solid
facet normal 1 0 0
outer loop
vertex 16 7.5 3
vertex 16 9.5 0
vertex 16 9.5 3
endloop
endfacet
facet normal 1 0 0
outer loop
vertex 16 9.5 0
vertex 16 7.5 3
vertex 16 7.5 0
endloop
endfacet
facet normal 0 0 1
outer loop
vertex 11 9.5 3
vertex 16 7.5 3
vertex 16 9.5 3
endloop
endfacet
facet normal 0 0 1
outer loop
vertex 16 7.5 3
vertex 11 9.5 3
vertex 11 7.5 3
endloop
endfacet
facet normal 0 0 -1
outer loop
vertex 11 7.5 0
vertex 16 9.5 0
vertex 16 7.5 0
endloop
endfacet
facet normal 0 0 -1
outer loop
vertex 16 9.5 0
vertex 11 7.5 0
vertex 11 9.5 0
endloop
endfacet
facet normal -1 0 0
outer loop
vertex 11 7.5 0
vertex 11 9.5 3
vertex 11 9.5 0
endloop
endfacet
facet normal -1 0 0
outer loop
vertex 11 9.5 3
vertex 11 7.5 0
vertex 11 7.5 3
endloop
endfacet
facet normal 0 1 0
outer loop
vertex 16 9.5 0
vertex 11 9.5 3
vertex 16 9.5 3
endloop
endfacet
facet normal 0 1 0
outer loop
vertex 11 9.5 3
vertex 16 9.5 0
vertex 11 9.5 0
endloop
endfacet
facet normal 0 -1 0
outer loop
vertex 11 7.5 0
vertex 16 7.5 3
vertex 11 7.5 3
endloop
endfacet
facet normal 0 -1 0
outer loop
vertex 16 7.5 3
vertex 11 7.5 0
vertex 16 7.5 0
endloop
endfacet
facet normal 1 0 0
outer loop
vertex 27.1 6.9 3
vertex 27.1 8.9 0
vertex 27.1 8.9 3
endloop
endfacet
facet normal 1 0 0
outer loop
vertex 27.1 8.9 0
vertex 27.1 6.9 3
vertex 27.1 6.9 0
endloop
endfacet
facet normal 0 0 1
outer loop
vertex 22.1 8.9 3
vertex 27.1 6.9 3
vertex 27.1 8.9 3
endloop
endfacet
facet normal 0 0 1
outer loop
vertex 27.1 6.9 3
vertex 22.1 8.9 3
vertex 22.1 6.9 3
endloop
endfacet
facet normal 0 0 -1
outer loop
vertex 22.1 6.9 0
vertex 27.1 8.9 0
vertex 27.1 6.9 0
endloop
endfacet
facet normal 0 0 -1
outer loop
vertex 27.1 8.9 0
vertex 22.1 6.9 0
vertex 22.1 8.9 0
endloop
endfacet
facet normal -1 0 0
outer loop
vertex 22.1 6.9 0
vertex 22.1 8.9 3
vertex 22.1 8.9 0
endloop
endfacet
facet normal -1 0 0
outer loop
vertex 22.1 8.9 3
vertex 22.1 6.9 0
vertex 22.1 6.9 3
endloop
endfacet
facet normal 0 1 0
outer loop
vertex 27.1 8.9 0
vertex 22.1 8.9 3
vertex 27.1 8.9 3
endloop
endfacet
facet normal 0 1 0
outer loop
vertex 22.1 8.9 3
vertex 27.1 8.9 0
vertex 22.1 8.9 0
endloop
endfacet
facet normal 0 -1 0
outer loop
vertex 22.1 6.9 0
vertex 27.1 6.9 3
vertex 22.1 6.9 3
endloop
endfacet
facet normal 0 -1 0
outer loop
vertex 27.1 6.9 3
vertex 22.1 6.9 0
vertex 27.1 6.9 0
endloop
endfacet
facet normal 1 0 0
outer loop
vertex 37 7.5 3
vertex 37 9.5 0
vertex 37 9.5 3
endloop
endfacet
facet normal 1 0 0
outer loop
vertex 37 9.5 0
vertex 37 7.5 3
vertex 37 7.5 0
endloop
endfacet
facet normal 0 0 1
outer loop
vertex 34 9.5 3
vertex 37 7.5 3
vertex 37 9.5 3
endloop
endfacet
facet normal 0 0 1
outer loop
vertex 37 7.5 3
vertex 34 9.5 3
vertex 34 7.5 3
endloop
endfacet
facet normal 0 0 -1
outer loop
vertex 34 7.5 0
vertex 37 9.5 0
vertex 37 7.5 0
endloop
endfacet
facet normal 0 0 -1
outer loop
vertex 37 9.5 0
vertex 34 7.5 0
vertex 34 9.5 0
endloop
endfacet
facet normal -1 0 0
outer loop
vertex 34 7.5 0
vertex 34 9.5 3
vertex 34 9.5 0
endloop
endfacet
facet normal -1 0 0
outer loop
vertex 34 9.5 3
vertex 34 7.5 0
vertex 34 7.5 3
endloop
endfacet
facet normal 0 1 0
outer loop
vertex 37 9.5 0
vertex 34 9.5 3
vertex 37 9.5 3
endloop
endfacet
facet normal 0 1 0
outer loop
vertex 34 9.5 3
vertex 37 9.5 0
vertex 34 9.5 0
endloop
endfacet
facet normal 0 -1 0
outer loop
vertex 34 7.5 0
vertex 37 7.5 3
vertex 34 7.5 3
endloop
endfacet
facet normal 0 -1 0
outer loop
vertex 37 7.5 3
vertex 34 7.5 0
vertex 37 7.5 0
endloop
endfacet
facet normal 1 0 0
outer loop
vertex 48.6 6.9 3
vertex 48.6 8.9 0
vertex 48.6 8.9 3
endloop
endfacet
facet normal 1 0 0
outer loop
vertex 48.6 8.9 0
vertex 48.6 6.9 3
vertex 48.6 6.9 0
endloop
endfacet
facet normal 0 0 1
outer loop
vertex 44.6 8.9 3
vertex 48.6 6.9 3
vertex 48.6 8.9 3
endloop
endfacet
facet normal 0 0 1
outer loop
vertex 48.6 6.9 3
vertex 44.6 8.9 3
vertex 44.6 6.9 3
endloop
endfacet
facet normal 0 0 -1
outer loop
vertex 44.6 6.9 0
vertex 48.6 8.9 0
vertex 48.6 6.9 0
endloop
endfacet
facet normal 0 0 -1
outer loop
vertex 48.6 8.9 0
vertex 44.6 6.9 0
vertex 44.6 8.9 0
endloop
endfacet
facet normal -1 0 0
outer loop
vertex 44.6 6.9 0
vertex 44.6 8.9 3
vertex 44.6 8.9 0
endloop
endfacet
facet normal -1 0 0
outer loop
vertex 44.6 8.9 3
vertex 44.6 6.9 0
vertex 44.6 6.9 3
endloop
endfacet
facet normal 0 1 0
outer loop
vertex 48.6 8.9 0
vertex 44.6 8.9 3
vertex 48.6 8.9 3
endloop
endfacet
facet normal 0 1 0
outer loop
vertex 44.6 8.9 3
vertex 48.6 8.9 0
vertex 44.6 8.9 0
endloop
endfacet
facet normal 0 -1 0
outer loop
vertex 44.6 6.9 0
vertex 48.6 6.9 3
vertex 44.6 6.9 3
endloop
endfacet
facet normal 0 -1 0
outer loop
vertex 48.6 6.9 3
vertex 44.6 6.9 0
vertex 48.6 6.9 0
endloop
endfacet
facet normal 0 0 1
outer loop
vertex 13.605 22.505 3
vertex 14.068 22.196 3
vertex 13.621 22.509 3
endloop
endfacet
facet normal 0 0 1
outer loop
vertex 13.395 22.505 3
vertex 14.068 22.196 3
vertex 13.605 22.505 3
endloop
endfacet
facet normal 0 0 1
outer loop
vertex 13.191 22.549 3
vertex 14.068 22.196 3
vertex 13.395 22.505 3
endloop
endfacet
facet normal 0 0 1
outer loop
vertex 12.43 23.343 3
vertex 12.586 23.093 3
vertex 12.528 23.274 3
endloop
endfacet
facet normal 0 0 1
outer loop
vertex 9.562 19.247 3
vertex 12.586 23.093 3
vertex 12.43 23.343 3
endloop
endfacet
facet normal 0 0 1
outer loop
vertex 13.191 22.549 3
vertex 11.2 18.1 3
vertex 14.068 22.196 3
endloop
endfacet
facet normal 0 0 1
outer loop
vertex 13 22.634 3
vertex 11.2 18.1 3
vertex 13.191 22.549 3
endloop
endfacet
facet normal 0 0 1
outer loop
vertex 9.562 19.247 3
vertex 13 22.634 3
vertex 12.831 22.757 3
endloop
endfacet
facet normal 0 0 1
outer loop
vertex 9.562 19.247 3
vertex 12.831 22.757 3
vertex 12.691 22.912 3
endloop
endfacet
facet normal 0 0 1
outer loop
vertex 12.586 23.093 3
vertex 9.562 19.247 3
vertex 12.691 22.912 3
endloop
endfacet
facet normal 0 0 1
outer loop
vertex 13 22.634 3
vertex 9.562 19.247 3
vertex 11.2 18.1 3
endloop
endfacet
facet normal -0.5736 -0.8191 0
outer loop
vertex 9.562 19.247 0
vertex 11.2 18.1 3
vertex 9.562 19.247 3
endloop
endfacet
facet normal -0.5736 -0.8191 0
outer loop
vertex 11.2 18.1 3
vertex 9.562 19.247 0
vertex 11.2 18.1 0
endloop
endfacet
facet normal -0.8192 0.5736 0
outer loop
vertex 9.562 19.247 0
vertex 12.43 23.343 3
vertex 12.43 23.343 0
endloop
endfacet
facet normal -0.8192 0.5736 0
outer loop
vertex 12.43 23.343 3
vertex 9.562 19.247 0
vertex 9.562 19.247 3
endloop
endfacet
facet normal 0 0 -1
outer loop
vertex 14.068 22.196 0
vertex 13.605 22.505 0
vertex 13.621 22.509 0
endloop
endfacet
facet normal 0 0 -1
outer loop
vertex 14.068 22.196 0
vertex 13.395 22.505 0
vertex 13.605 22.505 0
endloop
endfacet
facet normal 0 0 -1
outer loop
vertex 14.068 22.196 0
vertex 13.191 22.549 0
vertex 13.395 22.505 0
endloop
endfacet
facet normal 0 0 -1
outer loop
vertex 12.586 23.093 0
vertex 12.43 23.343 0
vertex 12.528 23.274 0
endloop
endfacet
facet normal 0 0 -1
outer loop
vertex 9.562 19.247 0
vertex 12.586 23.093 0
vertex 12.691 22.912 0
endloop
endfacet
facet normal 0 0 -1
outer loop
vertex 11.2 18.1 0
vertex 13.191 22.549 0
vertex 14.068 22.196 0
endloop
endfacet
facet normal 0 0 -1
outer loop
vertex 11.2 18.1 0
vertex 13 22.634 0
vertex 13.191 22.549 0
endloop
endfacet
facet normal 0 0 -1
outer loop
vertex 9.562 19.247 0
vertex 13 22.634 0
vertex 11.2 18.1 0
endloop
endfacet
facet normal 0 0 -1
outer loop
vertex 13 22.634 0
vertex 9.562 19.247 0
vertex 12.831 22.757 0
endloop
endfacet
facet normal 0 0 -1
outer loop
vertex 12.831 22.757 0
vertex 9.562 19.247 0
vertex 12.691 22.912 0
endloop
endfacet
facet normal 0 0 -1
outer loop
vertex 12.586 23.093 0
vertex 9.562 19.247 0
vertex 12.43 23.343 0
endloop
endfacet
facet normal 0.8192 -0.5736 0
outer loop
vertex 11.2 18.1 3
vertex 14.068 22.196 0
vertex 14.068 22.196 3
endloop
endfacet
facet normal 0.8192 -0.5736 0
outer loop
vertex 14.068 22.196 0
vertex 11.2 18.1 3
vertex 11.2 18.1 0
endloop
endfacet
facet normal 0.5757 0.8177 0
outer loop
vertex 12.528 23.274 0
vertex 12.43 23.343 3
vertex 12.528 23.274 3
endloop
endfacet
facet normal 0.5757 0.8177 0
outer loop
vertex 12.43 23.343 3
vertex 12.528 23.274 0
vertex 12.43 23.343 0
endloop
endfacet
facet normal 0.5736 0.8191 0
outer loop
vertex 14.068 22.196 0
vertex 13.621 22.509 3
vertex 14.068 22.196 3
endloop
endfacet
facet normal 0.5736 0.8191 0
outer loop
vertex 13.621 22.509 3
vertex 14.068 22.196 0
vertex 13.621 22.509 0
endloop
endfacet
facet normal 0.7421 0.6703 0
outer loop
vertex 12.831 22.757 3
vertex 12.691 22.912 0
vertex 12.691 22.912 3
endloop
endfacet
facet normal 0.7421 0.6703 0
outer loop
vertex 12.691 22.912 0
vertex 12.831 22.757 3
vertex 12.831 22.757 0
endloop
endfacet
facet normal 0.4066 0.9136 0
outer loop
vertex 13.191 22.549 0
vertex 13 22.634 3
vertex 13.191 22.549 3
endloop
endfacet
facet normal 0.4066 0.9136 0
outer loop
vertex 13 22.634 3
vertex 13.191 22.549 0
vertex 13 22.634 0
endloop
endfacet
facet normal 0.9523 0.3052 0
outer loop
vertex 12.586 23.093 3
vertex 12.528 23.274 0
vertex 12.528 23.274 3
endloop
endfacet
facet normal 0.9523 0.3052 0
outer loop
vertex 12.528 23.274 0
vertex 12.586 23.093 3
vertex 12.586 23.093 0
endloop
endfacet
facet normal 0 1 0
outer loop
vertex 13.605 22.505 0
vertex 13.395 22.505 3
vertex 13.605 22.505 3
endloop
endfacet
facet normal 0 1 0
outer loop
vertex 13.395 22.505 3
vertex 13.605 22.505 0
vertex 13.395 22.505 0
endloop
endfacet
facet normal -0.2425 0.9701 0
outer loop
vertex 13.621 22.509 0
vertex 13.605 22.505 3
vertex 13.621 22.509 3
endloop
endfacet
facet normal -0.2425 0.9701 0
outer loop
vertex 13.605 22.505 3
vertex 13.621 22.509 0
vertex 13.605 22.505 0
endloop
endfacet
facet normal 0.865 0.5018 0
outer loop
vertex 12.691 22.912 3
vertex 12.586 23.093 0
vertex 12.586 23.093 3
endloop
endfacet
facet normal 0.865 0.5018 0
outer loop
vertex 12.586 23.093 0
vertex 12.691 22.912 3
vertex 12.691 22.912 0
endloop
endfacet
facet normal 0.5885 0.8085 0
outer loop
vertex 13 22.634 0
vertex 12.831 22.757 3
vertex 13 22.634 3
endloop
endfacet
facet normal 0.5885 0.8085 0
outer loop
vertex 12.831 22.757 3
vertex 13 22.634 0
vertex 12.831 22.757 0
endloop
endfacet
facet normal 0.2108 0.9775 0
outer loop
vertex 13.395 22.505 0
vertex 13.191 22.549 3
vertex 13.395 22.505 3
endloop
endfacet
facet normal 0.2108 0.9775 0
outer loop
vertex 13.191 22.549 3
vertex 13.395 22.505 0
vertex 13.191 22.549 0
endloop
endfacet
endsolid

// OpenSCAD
// Nametage template for helen.
// 

$fs=0.2;

difference () {
    union () {
        translate ([11,7.5,0]){cube([5,2,3]);}
        translate ([22.1,6.9,0]){cube([5,2,3]);}
        translate ([34,7.5,0]){cube([3,2,3]);}
        translate ([44.6,6.9,0]){cube([4,2,3]);}

        // and the hat
        translate ([11.2,18.1,0]){
            rotate ([0,0,55]) {cube([5,2,3]);}
        }



        linear_extrude(file = "sarah.dxf", 
          height = 6, center = false, convexity = 10,  scale=1);
    }
    translate ([13.5,23.5,-0.1]){ cylinder(h=7,r=1);}
}
